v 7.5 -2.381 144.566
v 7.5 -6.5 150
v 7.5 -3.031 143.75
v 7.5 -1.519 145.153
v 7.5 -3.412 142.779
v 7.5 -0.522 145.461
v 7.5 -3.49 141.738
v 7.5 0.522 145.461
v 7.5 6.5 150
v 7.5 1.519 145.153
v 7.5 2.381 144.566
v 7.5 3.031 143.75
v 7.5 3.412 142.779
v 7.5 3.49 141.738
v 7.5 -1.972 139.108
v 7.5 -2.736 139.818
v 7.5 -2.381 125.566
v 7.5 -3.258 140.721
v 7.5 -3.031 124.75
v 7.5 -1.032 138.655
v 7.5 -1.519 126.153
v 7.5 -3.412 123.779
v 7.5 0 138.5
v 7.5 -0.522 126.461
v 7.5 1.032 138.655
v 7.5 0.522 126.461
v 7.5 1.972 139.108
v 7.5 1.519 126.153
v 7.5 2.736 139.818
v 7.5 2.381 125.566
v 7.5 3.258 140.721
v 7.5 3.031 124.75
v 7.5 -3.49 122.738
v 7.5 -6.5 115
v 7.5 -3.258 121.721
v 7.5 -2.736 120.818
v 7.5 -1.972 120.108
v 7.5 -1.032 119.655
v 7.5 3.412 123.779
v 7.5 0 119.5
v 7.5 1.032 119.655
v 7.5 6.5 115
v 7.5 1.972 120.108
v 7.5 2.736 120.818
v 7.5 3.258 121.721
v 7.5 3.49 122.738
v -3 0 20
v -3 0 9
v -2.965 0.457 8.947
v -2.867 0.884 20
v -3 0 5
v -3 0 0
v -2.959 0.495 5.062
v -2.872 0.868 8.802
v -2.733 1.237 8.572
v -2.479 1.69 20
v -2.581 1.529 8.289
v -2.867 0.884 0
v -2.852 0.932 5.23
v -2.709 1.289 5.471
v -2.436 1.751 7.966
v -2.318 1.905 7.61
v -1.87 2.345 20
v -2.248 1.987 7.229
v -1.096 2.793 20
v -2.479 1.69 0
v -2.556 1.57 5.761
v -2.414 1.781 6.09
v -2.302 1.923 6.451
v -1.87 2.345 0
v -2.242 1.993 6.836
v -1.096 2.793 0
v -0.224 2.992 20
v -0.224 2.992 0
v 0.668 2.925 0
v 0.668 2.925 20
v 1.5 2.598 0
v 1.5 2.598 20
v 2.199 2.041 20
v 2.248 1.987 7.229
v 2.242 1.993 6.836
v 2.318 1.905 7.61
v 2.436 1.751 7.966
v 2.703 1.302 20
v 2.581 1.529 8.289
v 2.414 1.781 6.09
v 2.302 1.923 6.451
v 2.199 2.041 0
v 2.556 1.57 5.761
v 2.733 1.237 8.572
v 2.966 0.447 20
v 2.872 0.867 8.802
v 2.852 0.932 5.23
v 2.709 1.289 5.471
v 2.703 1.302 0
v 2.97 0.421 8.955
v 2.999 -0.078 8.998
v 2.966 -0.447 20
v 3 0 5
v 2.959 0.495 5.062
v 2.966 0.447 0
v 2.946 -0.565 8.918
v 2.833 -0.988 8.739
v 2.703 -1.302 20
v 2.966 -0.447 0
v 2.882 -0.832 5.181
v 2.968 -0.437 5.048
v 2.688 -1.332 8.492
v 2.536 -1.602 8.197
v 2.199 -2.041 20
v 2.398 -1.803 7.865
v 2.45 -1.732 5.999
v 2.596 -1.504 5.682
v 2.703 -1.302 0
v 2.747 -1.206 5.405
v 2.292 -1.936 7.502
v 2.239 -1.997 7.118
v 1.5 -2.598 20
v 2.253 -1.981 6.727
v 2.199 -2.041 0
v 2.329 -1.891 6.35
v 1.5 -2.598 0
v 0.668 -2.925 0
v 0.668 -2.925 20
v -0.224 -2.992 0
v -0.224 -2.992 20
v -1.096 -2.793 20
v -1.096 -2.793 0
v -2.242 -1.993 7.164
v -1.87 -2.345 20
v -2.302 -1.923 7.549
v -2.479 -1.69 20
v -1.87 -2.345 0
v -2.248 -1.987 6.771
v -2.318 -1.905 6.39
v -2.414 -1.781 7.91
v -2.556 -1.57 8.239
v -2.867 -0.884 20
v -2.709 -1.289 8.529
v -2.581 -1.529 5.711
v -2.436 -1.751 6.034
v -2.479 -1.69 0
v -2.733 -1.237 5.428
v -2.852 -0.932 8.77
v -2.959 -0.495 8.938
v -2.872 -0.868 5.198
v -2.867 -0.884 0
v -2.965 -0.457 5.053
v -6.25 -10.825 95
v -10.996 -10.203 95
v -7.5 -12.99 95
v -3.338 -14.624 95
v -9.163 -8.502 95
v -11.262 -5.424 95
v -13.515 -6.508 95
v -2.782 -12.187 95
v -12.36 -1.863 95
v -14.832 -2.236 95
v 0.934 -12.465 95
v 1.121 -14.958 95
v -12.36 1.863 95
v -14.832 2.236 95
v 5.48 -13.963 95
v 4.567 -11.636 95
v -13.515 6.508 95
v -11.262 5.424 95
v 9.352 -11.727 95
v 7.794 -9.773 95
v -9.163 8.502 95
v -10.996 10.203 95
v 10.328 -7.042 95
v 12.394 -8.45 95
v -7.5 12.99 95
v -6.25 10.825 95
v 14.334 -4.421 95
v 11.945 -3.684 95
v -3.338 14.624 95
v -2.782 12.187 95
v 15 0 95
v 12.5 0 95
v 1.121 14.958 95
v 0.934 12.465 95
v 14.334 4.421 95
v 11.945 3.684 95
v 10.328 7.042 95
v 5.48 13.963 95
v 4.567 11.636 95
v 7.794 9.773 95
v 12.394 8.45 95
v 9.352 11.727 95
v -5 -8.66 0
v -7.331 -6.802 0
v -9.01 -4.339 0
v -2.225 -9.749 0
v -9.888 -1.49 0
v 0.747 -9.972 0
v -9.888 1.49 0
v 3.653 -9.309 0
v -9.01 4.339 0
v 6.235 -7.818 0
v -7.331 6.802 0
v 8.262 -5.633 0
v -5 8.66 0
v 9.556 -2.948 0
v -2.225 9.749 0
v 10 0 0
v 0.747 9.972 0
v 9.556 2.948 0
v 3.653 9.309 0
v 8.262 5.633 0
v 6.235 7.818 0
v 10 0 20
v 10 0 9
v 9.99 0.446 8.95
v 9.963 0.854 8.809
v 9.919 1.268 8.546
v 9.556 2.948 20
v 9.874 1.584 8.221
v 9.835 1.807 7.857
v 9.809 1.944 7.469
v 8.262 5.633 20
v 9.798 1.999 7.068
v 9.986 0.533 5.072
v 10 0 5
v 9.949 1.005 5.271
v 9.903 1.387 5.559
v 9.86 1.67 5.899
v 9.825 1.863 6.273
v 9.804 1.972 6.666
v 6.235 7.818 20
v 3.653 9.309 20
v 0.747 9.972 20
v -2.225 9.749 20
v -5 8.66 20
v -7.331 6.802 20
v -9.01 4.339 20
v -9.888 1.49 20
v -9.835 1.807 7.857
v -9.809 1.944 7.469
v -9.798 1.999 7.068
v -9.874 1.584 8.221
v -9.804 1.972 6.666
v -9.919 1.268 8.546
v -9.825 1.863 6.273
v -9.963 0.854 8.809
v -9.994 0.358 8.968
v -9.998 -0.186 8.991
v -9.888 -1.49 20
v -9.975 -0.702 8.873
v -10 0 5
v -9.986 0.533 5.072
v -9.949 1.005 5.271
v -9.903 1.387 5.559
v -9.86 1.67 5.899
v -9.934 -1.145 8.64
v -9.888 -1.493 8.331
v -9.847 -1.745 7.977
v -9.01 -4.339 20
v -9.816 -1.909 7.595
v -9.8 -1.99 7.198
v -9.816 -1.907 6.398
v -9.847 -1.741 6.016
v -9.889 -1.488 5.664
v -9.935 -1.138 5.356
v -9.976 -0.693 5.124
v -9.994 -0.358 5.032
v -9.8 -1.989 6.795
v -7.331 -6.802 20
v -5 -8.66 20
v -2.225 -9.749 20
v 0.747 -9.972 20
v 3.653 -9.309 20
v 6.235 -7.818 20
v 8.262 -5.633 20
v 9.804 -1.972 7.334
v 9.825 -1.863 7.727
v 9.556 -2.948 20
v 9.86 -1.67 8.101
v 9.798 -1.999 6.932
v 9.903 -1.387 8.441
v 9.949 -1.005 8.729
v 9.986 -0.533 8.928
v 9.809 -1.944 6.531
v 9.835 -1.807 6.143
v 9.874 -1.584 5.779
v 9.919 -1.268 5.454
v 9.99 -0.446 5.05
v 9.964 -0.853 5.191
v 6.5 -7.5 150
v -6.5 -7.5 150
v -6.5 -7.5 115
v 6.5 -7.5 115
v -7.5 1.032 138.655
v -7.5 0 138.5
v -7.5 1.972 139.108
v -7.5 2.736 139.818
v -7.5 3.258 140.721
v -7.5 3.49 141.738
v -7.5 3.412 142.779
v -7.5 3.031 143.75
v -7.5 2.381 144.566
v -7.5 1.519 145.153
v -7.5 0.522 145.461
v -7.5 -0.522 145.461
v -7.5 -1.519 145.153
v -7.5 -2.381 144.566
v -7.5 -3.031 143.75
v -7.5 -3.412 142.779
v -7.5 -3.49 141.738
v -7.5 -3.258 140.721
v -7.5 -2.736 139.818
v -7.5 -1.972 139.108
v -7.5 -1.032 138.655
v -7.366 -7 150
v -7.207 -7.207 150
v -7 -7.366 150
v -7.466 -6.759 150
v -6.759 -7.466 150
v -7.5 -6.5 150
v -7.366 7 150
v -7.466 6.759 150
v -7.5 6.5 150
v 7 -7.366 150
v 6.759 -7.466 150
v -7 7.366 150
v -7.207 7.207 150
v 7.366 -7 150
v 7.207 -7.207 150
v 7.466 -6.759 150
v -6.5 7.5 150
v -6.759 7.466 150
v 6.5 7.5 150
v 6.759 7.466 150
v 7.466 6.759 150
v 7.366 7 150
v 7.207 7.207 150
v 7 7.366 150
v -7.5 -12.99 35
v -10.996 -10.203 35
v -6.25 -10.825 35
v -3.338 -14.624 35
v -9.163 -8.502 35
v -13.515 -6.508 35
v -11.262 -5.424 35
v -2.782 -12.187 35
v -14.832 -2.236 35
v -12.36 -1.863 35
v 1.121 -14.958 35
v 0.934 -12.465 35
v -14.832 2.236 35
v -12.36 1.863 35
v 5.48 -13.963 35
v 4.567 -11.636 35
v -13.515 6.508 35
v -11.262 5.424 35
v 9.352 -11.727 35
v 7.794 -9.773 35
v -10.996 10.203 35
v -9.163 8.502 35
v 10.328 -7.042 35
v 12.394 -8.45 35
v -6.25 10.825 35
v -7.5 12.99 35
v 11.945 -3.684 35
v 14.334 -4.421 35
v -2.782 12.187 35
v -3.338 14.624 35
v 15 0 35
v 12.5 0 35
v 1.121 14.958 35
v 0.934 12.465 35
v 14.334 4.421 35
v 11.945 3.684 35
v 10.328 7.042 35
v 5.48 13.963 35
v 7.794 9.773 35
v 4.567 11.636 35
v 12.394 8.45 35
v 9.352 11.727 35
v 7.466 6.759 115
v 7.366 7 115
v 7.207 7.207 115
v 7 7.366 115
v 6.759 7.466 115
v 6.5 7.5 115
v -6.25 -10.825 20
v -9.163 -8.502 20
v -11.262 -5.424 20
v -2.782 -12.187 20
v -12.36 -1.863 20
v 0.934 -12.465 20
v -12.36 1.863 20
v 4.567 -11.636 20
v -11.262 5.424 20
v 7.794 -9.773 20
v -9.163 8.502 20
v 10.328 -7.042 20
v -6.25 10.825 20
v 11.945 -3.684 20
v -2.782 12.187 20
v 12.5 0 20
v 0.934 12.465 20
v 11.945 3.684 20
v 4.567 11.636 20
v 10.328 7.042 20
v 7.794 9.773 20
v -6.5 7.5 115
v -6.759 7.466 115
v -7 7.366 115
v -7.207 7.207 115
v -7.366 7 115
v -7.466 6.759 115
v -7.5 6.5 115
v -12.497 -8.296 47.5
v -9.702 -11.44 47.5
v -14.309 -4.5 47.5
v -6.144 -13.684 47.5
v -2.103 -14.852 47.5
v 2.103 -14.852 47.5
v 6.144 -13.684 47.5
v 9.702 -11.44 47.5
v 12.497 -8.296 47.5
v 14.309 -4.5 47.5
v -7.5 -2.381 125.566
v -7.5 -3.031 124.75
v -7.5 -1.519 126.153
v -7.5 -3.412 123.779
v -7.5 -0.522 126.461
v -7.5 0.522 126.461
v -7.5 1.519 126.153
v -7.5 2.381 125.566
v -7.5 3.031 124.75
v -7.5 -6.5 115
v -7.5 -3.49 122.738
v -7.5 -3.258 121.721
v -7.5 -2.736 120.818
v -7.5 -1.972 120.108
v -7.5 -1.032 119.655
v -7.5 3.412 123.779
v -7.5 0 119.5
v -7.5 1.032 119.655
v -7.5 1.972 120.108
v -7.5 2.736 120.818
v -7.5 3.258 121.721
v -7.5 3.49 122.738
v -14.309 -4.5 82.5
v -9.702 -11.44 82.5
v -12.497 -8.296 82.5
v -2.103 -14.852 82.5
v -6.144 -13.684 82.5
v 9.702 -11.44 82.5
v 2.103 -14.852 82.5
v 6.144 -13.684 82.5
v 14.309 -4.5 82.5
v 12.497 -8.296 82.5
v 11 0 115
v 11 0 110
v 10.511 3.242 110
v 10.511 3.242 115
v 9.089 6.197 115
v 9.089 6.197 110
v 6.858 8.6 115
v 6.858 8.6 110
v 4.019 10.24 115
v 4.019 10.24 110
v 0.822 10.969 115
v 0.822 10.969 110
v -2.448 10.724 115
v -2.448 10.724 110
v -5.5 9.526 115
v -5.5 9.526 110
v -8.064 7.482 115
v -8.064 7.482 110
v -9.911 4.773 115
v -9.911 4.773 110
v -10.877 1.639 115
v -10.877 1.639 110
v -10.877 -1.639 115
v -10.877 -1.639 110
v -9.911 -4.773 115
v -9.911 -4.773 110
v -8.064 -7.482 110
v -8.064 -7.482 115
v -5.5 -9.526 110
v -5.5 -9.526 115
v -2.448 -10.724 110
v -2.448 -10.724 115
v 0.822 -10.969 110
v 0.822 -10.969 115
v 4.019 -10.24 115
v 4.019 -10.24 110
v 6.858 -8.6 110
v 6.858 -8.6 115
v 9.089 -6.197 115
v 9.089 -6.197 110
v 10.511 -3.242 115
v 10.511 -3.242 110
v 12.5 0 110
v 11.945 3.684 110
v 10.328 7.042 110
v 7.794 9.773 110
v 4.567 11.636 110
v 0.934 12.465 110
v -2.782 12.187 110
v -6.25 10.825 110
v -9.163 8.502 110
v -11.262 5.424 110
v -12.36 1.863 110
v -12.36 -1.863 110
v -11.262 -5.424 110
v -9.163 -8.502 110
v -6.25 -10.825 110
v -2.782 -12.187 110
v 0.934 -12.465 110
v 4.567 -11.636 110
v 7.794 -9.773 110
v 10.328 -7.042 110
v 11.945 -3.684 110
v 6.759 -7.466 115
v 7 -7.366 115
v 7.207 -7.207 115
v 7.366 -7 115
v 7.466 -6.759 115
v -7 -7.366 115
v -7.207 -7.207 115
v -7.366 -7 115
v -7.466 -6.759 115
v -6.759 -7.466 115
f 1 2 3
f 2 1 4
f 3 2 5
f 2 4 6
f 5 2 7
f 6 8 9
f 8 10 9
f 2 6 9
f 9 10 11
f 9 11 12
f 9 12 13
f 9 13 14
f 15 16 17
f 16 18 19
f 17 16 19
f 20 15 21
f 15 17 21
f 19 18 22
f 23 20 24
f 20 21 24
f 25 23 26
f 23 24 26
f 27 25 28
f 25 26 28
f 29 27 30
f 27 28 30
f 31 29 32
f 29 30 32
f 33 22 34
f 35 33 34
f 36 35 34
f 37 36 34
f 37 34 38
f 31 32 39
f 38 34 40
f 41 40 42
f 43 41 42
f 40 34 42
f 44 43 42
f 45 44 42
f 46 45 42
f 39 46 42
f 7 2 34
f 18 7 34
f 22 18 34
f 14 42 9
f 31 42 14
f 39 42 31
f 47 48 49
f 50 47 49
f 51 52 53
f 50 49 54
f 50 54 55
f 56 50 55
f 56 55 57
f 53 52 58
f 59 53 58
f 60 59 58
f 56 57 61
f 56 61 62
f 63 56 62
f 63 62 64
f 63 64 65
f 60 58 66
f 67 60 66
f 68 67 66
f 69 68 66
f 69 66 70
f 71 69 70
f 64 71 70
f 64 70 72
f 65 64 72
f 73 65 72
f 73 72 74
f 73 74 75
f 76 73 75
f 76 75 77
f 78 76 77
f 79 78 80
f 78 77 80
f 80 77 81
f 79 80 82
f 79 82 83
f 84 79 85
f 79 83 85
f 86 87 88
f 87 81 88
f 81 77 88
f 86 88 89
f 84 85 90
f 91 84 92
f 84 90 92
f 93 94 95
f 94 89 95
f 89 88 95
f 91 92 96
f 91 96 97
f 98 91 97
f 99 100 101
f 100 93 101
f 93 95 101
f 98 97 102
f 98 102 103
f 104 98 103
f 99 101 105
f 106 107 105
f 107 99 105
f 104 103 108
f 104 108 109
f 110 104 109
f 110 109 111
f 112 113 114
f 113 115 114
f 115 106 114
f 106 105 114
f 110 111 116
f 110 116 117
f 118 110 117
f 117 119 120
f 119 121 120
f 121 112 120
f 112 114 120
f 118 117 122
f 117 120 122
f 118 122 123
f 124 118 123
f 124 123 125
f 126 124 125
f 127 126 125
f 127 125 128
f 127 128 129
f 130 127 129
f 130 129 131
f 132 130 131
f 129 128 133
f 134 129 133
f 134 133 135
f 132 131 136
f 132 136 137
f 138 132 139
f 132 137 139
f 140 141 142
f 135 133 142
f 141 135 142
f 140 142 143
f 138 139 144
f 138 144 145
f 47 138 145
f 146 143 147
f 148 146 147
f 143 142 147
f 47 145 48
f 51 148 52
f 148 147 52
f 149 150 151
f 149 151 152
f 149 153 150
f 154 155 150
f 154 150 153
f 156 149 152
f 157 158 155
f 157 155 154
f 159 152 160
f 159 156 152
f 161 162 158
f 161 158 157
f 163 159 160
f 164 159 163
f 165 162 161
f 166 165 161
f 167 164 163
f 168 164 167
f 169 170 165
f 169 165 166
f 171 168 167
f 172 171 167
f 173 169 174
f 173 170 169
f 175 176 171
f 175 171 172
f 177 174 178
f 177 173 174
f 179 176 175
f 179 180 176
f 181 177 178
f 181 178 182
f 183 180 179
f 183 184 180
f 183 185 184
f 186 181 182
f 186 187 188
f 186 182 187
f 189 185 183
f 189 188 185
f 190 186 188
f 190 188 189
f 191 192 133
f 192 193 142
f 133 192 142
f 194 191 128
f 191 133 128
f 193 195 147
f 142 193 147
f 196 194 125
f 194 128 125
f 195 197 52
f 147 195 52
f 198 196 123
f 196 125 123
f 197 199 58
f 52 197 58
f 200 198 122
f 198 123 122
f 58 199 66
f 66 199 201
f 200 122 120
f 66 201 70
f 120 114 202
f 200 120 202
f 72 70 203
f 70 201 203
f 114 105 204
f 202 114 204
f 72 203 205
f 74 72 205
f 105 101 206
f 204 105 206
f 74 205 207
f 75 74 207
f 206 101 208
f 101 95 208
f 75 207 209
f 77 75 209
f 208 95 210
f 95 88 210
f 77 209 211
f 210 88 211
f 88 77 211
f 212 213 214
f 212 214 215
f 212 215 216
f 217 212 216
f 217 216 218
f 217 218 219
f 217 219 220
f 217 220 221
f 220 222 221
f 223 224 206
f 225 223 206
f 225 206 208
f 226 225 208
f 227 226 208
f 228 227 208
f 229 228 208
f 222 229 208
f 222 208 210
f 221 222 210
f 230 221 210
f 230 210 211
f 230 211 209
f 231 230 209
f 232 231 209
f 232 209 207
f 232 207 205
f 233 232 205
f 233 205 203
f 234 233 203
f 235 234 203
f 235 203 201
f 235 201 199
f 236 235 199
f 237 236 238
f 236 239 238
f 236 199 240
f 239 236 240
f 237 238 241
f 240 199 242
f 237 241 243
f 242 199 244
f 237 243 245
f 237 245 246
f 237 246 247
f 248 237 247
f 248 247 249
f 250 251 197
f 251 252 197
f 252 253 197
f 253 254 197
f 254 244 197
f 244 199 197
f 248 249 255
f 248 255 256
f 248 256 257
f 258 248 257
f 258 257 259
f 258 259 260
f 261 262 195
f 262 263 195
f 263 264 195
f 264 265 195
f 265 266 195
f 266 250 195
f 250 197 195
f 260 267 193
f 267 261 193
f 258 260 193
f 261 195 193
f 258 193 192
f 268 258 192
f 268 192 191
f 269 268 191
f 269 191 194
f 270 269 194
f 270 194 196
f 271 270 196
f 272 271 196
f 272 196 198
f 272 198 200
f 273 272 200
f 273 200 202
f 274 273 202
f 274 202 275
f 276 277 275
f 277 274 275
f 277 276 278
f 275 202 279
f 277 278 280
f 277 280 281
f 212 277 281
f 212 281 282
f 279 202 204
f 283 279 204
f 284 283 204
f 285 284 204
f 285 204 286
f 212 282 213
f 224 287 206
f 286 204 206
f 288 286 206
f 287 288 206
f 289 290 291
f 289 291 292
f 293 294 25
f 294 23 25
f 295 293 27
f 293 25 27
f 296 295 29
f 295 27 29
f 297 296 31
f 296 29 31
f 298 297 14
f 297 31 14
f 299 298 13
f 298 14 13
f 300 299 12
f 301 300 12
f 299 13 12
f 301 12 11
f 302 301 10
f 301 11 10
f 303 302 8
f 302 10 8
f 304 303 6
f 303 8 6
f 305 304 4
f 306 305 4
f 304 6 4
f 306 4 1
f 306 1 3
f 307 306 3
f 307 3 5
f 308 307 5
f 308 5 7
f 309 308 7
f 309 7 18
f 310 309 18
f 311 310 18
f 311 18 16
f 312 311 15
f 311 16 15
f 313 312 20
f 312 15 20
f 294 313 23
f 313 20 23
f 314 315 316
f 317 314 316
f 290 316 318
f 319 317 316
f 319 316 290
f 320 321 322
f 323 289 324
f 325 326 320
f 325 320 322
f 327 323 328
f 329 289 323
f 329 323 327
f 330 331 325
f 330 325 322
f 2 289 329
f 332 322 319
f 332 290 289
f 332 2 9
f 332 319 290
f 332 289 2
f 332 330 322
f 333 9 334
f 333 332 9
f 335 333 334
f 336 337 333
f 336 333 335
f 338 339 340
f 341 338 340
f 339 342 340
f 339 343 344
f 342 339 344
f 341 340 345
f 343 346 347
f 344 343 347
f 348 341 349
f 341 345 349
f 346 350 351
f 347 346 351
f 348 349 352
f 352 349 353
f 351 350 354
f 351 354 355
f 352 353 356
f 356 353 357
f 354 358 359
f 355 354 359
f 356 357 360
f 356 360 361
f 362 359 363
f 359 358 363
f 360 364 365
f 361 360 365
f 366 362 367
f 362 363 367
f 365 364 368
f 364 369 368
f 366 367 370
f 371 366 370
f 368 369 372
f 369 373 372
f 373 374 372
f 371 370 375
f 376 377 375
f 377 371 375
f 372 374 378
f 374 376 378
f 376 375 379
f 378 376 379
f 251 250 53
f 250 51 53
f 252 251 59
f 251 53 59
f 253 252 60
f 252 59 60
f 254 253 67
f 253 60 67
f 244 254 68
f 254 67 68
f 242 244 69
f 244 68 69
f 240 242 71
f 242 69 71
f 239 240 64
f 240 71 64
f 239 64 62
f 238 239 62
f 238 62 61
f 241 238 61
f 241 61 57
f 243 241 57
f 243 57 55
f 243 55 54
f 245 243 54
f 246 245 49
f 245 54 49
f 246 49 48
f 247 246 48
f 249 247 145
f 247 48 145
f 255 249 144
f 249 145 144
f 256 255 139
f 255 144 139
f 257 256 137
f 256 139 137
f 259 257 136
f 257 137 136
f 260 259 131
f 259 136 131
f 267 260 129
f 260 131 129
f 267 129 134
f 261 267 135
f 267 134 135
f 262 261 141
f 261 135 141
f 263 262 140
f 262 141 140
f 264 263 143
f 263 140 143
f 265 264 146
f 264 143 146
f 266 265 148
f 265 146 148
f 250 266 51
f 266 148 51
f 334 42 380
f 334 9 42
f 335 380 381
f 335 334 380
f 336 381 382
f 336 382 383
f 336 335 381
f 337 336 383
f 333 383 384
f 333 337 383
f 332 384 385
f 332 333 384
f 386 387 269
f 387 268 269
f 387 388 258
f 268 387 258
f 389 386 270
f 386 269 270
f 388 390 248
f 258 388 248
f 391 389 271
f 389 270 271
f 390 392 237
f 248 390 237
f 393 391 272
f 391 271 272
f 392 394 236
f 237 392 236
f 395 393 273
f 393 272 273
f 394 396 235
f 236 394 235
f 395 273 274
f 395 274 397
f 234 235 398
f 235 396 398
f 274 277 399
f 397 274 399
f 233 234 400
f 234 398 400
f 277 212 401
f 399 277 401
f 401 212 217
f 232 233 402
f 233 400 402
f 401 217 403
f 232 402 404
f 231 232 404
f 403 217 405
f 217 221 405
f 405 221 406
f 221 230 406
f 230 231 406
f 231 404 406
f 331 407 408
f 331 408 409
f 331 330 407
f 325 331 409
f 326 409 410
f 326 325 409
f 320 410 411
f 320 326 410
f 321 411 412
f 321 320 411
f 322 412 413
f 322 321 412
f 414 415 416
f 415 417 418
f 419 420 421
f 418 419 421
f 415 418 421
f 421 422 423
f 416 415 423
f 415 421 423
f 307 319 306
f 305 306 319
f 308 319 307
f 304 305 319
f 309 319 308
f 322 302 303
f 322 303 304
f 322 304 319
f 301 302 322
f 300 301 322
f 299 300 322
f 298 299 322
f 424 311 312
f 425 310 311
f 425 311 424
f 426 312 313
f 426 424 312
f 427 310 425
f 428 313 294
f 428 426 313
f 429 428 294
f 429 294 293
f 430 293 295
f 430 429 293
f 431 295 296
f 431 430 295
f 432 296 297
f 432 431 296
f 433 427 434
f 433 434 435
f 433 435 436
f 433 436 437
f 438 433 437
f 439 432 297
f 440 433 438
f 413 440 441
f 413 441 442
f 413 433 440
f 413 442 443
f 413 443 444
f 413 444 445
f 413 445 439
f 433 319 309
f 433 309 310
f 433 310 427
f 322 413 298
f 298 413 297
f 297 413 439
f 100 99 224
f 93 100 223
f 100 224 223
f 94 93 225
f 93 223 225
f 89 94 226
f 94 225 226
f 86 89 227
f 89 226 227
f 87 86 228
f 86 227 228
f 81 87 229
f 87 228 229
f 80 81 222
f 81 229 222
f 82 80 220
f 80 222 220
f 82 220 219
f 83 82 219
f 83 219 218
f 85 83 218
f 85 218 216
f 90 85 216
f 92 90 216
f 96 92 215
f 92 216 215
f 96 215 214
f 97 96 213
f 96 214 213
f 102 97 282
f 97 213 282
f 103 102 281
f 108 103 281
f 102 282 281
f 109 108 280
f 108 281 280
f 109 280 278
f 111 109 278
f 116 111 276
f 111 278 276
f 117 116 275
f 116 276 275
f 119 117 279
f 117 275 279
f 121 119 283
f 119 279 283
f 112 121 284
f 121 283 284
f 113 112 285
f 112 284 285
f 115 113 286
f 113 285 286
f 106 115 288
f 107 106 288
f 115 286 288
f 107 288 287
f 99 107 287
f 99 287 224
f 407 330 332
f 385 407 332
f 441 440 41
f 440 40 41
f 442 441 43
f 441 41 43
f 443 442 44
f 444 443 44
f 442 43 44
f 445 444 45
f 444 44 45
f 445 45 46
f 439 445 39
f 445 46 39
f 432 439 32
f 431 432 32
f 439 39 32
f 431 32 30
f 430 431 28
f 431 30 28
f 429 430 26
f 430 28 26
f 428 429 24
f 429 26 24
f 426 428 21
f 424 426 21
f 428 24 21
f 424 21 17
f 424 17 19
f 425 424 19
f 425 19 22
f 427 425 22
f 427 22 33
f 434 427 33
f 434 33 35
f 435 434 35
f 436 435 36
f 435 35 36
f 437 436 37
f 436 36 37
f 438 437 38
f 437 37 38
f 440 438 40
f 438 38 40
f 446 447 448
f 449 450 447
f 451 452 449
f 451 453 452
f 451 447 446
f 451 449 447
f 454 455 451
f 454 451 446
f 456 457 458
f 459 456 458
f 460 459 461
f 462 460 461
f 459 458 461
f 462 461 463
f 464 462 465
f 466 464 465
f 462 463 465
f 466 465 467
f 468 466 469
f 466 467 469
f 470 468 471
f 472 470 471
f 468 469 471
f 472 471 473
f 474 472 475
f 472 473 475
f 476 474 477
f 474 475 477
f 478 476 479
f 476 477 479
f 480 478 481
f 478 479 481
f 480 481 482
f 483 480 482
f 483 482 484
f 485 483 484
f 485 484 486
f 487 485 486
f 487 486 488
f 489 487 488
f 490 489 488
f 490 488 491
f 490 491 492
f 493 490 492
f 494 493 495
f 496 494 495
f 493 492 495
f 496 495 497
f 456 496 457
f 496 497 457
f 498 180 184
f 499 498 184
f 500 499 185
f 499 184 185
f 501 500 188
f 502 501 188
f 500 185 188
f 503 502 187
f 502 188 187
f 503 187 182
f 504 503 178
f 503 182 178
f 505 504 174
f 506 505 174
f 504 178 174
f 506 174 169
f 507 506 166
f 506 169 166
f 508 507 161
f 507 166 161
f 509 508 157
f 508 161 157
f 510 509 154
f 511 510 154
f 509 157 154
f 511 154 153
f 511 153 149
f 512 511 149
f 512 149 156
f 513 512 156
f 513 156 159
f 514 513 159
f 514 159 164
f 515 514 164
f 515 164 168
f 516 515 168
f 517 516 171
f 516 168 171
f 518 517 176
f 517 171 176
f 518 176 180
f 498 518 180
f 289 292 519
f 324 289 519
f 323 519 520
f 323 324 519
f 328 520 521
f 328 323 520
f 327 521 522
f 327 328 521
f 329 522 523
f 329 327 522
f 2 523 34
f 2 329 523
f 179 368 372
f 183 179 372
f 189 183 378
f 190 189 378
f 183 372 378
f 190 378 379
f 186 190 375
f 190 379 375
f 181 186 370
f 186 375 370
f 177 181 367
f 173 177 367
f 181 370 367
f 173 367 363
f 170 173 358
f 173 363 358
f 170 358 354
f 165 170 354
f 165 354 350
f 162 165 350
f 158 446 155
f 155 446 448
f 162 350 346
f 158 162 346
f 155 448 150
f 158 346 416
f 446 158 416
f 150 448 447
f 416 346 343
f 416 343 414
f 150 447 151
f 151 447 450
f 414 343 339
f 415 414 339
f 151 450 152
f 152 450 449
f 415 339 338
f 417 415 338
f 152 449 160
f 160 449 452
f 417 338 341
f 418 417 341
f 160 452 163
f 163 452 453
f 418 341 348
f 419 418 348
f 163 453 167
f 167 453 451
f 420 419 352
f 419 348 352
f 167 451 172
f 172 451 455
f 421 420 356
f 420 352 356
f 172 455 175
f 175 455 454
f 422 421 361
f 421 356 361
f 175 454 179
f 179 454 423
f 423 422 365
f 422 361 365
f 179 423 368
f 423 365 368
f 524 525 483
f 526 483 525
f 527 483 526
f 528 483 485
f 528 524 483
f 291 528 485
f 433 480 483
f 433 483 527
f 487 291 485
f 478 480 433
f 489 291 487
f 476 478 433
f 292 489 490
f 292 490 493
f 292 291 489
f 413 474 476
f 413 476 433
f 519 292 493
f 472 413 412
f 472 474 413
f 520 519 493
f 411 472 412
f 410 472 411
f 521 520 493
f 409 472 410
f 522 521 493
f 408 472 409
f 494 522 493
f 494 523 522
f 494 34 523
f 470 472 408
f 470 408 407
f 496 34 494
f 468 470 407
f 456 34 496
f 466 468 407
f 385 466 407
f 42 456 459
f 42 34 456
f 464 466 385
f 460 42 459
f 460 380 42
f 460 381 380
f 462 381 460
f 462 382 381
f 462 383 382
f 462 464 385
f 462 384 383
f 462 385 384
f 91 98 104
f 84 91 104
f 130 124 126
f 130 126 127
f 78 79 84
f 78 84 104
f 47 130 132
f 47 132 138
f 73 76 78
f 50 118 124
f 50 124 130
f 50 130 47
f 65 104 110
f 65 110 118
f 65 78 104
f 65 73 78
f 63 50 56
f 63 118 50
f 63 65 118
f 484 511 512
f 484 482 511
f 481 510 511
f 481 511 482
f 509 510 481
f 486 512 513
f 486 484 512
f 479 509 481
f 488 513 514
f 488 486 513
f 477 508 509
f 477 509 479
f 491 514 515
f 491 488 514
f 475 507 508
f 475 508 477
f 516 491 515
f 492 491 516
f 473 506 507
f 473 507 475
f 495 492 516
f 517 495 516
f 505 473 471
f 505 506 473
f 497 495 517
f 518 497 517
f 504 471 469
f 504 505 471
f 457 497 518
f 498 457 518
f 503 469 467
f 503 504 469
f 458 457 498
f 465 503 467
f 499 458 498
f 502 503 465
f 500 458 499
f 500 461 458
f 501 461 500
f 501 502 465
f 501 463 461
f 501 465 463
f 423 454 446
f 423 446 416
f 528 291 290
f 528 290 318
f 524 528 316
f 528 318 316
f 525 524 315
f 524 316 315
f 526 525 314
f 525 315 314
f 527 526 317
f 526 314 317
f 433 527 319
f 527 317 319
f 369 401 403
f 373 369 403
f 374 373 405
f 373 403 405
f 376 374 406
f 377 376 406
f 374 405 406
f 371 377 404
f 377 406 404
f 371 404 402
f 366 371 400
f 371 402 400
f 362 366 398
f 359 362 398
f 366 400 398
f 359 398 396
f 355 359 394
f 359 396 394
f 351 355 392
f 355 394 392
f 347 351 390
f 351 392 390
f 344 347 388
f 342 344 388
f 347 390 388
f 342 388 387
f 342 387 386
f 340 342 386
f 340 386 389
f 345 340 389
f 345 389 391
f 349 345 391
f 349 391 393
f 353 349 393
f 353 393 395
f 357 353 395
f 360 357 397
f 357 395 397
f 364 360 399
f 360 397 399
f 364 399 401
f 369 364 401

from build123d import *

# Parameters (mm, degrees)
SKETCH_1_R          = 10
EXTRUDE_1_DEPTH     = 20
SKETCH_2_R          = 12.5
EXTRUDE_2_DEPTH     = 15
SKETCH_3_R          = 15
EXTRUDE_3_DEPTH     = 60
SKETCH_4_R          = 12.5
EXTRUDE_4_DEPTH     = 15
SKETCH_5_R          = 11
EXTRUDE_5_DEPTH     = 5
SKETCH_6_W          = 15
SKETCH_6_H          = 15
EXTRUDE_6_DEPTH     = 35
SKETCH_7_R          = 3
CUT_EXTRUDE_1_DEPTH = 20
SKETCH_8_R          = 2
CUT_EXTRUDE_2_DEPTH = 20
SKETCH_9_W          = 35
SKETCH_9_H          = 10.5
CUT_EXTRUDE_3_DEPTH = 20
SKETCH_10_R         = 3.5
CUT_EXTRUDE_4_DEPTH = 20
FILLET_1_R          = 1


with BuildPart() as part:
    # 草图1 → 凸台-拉伸1 (new body)
    with BuildSketch(Plane.XY):
        Circle(SKETCH_1_R)
    extrude(amount=EXTRUDE_1_DEPTH)

    # 草图2 → 凸台-拉伸2 (add)
    with BuildSketch(Plane.XY.offset(20)):
        Circle(SKETCH_2_R)
    extrude(amount=EXTRUDE_2_DEPTH)

    # 草图3 → 凸台-拉伸3 (add)
    with BuildSketch(Plane.XY.offset(35)):
        Circle(SKETCH_3_R)
    extrude(amount=EXTRUDE_3_DEPTH)

    # 草图4 → 凸台-拉伸4 (add)
    with BuildSketch(Plane.XY.offset(95)):
        Circle(SKETCH_4_R)
    extrude(amount=EXTRUDE_4_DEPTH)

    # 草图5 → 凸台-拉伸5 (add)
    with BuildSketch(Plane.XY.offset(110)):
        Circle(SKETCH_5_R)
    extrude(amount=EXTRUDE_5_DEPTH)

    # 草图6 → 凸台-拉伸6 (add)
    with BuildSketch(Plane.XY.offset(115)):
        Rectangle(SKETCH_6_W, SKETCH_6_H)
    extrude(amount=EXTRUDE_6_DEPTH)

    # 草图7 → 切除-拉伸1 (cut)
    with BuildSketch(Plane(origin=(0, 0, 0), x_dir=(-1, 0, 0), z_dir=(0, 0, -1))):
        Circle(SKETCH_7_R)
    extrude(amount=-CUT_EXTRUDE_1_DEPTH, mode=Mode.SUBTRACT)

    # 草图8 → 切除-拉伸2 (cut, symmetric)
    with BuildSketch(Plane(origin=(0, 0, 0), x_dir=(0, 0, -1), z_dir=(1, 0, 0))):
        with Locations((-7, 0)):
            Circle(SKETCH_8_R)
    extrude(amount=CUT_EXTRUDE_2_DEPTH, both=True, mode=Mode.SUBTRACT)

    # 草图9 → 切除-拉伸3 (cut, symmetric)
    with BuildSketch(Plane(origin=(0, 0, 0), x_dir=(0, 0, -1), z_dir=(1, 0, 0))):
        with Locations((-65, -9.75)):
            Rectangle(SKETCH_9_W, SKETCH_9_H)
    extrude(amount=CUT_EXTRUDE_3_DEPTH, both=True, mode=Mode.SUBTRACT)

    # 草图10 → 切除-拉伸4 (cut, symmetric)
    with BuildSketch(Plane(origin=(0, 0, 0), x_dir=(0, 0, -1), z_dir=(1, 0, 0))):
        with Locations((-142, 0)):
            Circle(SKETCH_10_R)
        with Locations((-123, 0)):
            Circle(SKETCH_10_R)
    extrude(amount=CUT_EXTRUDE_4_DEPTH, both=True, mode=Mode.SUBTRACT)

    # 圆角1
    fillet_1_edges = [part.edges().sort_by_distance(p)[0] for p in [
        (-7.5, 7.5, 132.5),
        (-7.5, -7.5, 132.5),
        (7.5, -7.5, 132.5),
        (7.5, 7.5, 132.5),
    ]]
    fillet(fillet_1_edges, radius=FILLET_1_R)


solid = part.part
